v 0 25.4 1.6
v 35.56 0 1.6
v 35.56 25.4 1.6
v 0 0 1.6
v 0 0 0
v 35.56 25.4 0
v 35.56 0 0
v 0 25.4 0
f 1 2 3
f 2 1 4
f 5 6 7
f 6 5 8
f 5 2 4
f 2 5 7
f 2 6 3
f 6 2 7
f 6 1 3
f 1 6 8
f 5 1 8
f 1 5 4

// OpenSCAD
$fn = 64;

pcb_length = 35.56;   // mm
pcb_width  = 25.4;    // mm
pcb_thick  = 1.6;     // mm

color([0.05, 0.45, 0.18])
cube([pcb_length, pcb_width, pcb_thick], center=false);
